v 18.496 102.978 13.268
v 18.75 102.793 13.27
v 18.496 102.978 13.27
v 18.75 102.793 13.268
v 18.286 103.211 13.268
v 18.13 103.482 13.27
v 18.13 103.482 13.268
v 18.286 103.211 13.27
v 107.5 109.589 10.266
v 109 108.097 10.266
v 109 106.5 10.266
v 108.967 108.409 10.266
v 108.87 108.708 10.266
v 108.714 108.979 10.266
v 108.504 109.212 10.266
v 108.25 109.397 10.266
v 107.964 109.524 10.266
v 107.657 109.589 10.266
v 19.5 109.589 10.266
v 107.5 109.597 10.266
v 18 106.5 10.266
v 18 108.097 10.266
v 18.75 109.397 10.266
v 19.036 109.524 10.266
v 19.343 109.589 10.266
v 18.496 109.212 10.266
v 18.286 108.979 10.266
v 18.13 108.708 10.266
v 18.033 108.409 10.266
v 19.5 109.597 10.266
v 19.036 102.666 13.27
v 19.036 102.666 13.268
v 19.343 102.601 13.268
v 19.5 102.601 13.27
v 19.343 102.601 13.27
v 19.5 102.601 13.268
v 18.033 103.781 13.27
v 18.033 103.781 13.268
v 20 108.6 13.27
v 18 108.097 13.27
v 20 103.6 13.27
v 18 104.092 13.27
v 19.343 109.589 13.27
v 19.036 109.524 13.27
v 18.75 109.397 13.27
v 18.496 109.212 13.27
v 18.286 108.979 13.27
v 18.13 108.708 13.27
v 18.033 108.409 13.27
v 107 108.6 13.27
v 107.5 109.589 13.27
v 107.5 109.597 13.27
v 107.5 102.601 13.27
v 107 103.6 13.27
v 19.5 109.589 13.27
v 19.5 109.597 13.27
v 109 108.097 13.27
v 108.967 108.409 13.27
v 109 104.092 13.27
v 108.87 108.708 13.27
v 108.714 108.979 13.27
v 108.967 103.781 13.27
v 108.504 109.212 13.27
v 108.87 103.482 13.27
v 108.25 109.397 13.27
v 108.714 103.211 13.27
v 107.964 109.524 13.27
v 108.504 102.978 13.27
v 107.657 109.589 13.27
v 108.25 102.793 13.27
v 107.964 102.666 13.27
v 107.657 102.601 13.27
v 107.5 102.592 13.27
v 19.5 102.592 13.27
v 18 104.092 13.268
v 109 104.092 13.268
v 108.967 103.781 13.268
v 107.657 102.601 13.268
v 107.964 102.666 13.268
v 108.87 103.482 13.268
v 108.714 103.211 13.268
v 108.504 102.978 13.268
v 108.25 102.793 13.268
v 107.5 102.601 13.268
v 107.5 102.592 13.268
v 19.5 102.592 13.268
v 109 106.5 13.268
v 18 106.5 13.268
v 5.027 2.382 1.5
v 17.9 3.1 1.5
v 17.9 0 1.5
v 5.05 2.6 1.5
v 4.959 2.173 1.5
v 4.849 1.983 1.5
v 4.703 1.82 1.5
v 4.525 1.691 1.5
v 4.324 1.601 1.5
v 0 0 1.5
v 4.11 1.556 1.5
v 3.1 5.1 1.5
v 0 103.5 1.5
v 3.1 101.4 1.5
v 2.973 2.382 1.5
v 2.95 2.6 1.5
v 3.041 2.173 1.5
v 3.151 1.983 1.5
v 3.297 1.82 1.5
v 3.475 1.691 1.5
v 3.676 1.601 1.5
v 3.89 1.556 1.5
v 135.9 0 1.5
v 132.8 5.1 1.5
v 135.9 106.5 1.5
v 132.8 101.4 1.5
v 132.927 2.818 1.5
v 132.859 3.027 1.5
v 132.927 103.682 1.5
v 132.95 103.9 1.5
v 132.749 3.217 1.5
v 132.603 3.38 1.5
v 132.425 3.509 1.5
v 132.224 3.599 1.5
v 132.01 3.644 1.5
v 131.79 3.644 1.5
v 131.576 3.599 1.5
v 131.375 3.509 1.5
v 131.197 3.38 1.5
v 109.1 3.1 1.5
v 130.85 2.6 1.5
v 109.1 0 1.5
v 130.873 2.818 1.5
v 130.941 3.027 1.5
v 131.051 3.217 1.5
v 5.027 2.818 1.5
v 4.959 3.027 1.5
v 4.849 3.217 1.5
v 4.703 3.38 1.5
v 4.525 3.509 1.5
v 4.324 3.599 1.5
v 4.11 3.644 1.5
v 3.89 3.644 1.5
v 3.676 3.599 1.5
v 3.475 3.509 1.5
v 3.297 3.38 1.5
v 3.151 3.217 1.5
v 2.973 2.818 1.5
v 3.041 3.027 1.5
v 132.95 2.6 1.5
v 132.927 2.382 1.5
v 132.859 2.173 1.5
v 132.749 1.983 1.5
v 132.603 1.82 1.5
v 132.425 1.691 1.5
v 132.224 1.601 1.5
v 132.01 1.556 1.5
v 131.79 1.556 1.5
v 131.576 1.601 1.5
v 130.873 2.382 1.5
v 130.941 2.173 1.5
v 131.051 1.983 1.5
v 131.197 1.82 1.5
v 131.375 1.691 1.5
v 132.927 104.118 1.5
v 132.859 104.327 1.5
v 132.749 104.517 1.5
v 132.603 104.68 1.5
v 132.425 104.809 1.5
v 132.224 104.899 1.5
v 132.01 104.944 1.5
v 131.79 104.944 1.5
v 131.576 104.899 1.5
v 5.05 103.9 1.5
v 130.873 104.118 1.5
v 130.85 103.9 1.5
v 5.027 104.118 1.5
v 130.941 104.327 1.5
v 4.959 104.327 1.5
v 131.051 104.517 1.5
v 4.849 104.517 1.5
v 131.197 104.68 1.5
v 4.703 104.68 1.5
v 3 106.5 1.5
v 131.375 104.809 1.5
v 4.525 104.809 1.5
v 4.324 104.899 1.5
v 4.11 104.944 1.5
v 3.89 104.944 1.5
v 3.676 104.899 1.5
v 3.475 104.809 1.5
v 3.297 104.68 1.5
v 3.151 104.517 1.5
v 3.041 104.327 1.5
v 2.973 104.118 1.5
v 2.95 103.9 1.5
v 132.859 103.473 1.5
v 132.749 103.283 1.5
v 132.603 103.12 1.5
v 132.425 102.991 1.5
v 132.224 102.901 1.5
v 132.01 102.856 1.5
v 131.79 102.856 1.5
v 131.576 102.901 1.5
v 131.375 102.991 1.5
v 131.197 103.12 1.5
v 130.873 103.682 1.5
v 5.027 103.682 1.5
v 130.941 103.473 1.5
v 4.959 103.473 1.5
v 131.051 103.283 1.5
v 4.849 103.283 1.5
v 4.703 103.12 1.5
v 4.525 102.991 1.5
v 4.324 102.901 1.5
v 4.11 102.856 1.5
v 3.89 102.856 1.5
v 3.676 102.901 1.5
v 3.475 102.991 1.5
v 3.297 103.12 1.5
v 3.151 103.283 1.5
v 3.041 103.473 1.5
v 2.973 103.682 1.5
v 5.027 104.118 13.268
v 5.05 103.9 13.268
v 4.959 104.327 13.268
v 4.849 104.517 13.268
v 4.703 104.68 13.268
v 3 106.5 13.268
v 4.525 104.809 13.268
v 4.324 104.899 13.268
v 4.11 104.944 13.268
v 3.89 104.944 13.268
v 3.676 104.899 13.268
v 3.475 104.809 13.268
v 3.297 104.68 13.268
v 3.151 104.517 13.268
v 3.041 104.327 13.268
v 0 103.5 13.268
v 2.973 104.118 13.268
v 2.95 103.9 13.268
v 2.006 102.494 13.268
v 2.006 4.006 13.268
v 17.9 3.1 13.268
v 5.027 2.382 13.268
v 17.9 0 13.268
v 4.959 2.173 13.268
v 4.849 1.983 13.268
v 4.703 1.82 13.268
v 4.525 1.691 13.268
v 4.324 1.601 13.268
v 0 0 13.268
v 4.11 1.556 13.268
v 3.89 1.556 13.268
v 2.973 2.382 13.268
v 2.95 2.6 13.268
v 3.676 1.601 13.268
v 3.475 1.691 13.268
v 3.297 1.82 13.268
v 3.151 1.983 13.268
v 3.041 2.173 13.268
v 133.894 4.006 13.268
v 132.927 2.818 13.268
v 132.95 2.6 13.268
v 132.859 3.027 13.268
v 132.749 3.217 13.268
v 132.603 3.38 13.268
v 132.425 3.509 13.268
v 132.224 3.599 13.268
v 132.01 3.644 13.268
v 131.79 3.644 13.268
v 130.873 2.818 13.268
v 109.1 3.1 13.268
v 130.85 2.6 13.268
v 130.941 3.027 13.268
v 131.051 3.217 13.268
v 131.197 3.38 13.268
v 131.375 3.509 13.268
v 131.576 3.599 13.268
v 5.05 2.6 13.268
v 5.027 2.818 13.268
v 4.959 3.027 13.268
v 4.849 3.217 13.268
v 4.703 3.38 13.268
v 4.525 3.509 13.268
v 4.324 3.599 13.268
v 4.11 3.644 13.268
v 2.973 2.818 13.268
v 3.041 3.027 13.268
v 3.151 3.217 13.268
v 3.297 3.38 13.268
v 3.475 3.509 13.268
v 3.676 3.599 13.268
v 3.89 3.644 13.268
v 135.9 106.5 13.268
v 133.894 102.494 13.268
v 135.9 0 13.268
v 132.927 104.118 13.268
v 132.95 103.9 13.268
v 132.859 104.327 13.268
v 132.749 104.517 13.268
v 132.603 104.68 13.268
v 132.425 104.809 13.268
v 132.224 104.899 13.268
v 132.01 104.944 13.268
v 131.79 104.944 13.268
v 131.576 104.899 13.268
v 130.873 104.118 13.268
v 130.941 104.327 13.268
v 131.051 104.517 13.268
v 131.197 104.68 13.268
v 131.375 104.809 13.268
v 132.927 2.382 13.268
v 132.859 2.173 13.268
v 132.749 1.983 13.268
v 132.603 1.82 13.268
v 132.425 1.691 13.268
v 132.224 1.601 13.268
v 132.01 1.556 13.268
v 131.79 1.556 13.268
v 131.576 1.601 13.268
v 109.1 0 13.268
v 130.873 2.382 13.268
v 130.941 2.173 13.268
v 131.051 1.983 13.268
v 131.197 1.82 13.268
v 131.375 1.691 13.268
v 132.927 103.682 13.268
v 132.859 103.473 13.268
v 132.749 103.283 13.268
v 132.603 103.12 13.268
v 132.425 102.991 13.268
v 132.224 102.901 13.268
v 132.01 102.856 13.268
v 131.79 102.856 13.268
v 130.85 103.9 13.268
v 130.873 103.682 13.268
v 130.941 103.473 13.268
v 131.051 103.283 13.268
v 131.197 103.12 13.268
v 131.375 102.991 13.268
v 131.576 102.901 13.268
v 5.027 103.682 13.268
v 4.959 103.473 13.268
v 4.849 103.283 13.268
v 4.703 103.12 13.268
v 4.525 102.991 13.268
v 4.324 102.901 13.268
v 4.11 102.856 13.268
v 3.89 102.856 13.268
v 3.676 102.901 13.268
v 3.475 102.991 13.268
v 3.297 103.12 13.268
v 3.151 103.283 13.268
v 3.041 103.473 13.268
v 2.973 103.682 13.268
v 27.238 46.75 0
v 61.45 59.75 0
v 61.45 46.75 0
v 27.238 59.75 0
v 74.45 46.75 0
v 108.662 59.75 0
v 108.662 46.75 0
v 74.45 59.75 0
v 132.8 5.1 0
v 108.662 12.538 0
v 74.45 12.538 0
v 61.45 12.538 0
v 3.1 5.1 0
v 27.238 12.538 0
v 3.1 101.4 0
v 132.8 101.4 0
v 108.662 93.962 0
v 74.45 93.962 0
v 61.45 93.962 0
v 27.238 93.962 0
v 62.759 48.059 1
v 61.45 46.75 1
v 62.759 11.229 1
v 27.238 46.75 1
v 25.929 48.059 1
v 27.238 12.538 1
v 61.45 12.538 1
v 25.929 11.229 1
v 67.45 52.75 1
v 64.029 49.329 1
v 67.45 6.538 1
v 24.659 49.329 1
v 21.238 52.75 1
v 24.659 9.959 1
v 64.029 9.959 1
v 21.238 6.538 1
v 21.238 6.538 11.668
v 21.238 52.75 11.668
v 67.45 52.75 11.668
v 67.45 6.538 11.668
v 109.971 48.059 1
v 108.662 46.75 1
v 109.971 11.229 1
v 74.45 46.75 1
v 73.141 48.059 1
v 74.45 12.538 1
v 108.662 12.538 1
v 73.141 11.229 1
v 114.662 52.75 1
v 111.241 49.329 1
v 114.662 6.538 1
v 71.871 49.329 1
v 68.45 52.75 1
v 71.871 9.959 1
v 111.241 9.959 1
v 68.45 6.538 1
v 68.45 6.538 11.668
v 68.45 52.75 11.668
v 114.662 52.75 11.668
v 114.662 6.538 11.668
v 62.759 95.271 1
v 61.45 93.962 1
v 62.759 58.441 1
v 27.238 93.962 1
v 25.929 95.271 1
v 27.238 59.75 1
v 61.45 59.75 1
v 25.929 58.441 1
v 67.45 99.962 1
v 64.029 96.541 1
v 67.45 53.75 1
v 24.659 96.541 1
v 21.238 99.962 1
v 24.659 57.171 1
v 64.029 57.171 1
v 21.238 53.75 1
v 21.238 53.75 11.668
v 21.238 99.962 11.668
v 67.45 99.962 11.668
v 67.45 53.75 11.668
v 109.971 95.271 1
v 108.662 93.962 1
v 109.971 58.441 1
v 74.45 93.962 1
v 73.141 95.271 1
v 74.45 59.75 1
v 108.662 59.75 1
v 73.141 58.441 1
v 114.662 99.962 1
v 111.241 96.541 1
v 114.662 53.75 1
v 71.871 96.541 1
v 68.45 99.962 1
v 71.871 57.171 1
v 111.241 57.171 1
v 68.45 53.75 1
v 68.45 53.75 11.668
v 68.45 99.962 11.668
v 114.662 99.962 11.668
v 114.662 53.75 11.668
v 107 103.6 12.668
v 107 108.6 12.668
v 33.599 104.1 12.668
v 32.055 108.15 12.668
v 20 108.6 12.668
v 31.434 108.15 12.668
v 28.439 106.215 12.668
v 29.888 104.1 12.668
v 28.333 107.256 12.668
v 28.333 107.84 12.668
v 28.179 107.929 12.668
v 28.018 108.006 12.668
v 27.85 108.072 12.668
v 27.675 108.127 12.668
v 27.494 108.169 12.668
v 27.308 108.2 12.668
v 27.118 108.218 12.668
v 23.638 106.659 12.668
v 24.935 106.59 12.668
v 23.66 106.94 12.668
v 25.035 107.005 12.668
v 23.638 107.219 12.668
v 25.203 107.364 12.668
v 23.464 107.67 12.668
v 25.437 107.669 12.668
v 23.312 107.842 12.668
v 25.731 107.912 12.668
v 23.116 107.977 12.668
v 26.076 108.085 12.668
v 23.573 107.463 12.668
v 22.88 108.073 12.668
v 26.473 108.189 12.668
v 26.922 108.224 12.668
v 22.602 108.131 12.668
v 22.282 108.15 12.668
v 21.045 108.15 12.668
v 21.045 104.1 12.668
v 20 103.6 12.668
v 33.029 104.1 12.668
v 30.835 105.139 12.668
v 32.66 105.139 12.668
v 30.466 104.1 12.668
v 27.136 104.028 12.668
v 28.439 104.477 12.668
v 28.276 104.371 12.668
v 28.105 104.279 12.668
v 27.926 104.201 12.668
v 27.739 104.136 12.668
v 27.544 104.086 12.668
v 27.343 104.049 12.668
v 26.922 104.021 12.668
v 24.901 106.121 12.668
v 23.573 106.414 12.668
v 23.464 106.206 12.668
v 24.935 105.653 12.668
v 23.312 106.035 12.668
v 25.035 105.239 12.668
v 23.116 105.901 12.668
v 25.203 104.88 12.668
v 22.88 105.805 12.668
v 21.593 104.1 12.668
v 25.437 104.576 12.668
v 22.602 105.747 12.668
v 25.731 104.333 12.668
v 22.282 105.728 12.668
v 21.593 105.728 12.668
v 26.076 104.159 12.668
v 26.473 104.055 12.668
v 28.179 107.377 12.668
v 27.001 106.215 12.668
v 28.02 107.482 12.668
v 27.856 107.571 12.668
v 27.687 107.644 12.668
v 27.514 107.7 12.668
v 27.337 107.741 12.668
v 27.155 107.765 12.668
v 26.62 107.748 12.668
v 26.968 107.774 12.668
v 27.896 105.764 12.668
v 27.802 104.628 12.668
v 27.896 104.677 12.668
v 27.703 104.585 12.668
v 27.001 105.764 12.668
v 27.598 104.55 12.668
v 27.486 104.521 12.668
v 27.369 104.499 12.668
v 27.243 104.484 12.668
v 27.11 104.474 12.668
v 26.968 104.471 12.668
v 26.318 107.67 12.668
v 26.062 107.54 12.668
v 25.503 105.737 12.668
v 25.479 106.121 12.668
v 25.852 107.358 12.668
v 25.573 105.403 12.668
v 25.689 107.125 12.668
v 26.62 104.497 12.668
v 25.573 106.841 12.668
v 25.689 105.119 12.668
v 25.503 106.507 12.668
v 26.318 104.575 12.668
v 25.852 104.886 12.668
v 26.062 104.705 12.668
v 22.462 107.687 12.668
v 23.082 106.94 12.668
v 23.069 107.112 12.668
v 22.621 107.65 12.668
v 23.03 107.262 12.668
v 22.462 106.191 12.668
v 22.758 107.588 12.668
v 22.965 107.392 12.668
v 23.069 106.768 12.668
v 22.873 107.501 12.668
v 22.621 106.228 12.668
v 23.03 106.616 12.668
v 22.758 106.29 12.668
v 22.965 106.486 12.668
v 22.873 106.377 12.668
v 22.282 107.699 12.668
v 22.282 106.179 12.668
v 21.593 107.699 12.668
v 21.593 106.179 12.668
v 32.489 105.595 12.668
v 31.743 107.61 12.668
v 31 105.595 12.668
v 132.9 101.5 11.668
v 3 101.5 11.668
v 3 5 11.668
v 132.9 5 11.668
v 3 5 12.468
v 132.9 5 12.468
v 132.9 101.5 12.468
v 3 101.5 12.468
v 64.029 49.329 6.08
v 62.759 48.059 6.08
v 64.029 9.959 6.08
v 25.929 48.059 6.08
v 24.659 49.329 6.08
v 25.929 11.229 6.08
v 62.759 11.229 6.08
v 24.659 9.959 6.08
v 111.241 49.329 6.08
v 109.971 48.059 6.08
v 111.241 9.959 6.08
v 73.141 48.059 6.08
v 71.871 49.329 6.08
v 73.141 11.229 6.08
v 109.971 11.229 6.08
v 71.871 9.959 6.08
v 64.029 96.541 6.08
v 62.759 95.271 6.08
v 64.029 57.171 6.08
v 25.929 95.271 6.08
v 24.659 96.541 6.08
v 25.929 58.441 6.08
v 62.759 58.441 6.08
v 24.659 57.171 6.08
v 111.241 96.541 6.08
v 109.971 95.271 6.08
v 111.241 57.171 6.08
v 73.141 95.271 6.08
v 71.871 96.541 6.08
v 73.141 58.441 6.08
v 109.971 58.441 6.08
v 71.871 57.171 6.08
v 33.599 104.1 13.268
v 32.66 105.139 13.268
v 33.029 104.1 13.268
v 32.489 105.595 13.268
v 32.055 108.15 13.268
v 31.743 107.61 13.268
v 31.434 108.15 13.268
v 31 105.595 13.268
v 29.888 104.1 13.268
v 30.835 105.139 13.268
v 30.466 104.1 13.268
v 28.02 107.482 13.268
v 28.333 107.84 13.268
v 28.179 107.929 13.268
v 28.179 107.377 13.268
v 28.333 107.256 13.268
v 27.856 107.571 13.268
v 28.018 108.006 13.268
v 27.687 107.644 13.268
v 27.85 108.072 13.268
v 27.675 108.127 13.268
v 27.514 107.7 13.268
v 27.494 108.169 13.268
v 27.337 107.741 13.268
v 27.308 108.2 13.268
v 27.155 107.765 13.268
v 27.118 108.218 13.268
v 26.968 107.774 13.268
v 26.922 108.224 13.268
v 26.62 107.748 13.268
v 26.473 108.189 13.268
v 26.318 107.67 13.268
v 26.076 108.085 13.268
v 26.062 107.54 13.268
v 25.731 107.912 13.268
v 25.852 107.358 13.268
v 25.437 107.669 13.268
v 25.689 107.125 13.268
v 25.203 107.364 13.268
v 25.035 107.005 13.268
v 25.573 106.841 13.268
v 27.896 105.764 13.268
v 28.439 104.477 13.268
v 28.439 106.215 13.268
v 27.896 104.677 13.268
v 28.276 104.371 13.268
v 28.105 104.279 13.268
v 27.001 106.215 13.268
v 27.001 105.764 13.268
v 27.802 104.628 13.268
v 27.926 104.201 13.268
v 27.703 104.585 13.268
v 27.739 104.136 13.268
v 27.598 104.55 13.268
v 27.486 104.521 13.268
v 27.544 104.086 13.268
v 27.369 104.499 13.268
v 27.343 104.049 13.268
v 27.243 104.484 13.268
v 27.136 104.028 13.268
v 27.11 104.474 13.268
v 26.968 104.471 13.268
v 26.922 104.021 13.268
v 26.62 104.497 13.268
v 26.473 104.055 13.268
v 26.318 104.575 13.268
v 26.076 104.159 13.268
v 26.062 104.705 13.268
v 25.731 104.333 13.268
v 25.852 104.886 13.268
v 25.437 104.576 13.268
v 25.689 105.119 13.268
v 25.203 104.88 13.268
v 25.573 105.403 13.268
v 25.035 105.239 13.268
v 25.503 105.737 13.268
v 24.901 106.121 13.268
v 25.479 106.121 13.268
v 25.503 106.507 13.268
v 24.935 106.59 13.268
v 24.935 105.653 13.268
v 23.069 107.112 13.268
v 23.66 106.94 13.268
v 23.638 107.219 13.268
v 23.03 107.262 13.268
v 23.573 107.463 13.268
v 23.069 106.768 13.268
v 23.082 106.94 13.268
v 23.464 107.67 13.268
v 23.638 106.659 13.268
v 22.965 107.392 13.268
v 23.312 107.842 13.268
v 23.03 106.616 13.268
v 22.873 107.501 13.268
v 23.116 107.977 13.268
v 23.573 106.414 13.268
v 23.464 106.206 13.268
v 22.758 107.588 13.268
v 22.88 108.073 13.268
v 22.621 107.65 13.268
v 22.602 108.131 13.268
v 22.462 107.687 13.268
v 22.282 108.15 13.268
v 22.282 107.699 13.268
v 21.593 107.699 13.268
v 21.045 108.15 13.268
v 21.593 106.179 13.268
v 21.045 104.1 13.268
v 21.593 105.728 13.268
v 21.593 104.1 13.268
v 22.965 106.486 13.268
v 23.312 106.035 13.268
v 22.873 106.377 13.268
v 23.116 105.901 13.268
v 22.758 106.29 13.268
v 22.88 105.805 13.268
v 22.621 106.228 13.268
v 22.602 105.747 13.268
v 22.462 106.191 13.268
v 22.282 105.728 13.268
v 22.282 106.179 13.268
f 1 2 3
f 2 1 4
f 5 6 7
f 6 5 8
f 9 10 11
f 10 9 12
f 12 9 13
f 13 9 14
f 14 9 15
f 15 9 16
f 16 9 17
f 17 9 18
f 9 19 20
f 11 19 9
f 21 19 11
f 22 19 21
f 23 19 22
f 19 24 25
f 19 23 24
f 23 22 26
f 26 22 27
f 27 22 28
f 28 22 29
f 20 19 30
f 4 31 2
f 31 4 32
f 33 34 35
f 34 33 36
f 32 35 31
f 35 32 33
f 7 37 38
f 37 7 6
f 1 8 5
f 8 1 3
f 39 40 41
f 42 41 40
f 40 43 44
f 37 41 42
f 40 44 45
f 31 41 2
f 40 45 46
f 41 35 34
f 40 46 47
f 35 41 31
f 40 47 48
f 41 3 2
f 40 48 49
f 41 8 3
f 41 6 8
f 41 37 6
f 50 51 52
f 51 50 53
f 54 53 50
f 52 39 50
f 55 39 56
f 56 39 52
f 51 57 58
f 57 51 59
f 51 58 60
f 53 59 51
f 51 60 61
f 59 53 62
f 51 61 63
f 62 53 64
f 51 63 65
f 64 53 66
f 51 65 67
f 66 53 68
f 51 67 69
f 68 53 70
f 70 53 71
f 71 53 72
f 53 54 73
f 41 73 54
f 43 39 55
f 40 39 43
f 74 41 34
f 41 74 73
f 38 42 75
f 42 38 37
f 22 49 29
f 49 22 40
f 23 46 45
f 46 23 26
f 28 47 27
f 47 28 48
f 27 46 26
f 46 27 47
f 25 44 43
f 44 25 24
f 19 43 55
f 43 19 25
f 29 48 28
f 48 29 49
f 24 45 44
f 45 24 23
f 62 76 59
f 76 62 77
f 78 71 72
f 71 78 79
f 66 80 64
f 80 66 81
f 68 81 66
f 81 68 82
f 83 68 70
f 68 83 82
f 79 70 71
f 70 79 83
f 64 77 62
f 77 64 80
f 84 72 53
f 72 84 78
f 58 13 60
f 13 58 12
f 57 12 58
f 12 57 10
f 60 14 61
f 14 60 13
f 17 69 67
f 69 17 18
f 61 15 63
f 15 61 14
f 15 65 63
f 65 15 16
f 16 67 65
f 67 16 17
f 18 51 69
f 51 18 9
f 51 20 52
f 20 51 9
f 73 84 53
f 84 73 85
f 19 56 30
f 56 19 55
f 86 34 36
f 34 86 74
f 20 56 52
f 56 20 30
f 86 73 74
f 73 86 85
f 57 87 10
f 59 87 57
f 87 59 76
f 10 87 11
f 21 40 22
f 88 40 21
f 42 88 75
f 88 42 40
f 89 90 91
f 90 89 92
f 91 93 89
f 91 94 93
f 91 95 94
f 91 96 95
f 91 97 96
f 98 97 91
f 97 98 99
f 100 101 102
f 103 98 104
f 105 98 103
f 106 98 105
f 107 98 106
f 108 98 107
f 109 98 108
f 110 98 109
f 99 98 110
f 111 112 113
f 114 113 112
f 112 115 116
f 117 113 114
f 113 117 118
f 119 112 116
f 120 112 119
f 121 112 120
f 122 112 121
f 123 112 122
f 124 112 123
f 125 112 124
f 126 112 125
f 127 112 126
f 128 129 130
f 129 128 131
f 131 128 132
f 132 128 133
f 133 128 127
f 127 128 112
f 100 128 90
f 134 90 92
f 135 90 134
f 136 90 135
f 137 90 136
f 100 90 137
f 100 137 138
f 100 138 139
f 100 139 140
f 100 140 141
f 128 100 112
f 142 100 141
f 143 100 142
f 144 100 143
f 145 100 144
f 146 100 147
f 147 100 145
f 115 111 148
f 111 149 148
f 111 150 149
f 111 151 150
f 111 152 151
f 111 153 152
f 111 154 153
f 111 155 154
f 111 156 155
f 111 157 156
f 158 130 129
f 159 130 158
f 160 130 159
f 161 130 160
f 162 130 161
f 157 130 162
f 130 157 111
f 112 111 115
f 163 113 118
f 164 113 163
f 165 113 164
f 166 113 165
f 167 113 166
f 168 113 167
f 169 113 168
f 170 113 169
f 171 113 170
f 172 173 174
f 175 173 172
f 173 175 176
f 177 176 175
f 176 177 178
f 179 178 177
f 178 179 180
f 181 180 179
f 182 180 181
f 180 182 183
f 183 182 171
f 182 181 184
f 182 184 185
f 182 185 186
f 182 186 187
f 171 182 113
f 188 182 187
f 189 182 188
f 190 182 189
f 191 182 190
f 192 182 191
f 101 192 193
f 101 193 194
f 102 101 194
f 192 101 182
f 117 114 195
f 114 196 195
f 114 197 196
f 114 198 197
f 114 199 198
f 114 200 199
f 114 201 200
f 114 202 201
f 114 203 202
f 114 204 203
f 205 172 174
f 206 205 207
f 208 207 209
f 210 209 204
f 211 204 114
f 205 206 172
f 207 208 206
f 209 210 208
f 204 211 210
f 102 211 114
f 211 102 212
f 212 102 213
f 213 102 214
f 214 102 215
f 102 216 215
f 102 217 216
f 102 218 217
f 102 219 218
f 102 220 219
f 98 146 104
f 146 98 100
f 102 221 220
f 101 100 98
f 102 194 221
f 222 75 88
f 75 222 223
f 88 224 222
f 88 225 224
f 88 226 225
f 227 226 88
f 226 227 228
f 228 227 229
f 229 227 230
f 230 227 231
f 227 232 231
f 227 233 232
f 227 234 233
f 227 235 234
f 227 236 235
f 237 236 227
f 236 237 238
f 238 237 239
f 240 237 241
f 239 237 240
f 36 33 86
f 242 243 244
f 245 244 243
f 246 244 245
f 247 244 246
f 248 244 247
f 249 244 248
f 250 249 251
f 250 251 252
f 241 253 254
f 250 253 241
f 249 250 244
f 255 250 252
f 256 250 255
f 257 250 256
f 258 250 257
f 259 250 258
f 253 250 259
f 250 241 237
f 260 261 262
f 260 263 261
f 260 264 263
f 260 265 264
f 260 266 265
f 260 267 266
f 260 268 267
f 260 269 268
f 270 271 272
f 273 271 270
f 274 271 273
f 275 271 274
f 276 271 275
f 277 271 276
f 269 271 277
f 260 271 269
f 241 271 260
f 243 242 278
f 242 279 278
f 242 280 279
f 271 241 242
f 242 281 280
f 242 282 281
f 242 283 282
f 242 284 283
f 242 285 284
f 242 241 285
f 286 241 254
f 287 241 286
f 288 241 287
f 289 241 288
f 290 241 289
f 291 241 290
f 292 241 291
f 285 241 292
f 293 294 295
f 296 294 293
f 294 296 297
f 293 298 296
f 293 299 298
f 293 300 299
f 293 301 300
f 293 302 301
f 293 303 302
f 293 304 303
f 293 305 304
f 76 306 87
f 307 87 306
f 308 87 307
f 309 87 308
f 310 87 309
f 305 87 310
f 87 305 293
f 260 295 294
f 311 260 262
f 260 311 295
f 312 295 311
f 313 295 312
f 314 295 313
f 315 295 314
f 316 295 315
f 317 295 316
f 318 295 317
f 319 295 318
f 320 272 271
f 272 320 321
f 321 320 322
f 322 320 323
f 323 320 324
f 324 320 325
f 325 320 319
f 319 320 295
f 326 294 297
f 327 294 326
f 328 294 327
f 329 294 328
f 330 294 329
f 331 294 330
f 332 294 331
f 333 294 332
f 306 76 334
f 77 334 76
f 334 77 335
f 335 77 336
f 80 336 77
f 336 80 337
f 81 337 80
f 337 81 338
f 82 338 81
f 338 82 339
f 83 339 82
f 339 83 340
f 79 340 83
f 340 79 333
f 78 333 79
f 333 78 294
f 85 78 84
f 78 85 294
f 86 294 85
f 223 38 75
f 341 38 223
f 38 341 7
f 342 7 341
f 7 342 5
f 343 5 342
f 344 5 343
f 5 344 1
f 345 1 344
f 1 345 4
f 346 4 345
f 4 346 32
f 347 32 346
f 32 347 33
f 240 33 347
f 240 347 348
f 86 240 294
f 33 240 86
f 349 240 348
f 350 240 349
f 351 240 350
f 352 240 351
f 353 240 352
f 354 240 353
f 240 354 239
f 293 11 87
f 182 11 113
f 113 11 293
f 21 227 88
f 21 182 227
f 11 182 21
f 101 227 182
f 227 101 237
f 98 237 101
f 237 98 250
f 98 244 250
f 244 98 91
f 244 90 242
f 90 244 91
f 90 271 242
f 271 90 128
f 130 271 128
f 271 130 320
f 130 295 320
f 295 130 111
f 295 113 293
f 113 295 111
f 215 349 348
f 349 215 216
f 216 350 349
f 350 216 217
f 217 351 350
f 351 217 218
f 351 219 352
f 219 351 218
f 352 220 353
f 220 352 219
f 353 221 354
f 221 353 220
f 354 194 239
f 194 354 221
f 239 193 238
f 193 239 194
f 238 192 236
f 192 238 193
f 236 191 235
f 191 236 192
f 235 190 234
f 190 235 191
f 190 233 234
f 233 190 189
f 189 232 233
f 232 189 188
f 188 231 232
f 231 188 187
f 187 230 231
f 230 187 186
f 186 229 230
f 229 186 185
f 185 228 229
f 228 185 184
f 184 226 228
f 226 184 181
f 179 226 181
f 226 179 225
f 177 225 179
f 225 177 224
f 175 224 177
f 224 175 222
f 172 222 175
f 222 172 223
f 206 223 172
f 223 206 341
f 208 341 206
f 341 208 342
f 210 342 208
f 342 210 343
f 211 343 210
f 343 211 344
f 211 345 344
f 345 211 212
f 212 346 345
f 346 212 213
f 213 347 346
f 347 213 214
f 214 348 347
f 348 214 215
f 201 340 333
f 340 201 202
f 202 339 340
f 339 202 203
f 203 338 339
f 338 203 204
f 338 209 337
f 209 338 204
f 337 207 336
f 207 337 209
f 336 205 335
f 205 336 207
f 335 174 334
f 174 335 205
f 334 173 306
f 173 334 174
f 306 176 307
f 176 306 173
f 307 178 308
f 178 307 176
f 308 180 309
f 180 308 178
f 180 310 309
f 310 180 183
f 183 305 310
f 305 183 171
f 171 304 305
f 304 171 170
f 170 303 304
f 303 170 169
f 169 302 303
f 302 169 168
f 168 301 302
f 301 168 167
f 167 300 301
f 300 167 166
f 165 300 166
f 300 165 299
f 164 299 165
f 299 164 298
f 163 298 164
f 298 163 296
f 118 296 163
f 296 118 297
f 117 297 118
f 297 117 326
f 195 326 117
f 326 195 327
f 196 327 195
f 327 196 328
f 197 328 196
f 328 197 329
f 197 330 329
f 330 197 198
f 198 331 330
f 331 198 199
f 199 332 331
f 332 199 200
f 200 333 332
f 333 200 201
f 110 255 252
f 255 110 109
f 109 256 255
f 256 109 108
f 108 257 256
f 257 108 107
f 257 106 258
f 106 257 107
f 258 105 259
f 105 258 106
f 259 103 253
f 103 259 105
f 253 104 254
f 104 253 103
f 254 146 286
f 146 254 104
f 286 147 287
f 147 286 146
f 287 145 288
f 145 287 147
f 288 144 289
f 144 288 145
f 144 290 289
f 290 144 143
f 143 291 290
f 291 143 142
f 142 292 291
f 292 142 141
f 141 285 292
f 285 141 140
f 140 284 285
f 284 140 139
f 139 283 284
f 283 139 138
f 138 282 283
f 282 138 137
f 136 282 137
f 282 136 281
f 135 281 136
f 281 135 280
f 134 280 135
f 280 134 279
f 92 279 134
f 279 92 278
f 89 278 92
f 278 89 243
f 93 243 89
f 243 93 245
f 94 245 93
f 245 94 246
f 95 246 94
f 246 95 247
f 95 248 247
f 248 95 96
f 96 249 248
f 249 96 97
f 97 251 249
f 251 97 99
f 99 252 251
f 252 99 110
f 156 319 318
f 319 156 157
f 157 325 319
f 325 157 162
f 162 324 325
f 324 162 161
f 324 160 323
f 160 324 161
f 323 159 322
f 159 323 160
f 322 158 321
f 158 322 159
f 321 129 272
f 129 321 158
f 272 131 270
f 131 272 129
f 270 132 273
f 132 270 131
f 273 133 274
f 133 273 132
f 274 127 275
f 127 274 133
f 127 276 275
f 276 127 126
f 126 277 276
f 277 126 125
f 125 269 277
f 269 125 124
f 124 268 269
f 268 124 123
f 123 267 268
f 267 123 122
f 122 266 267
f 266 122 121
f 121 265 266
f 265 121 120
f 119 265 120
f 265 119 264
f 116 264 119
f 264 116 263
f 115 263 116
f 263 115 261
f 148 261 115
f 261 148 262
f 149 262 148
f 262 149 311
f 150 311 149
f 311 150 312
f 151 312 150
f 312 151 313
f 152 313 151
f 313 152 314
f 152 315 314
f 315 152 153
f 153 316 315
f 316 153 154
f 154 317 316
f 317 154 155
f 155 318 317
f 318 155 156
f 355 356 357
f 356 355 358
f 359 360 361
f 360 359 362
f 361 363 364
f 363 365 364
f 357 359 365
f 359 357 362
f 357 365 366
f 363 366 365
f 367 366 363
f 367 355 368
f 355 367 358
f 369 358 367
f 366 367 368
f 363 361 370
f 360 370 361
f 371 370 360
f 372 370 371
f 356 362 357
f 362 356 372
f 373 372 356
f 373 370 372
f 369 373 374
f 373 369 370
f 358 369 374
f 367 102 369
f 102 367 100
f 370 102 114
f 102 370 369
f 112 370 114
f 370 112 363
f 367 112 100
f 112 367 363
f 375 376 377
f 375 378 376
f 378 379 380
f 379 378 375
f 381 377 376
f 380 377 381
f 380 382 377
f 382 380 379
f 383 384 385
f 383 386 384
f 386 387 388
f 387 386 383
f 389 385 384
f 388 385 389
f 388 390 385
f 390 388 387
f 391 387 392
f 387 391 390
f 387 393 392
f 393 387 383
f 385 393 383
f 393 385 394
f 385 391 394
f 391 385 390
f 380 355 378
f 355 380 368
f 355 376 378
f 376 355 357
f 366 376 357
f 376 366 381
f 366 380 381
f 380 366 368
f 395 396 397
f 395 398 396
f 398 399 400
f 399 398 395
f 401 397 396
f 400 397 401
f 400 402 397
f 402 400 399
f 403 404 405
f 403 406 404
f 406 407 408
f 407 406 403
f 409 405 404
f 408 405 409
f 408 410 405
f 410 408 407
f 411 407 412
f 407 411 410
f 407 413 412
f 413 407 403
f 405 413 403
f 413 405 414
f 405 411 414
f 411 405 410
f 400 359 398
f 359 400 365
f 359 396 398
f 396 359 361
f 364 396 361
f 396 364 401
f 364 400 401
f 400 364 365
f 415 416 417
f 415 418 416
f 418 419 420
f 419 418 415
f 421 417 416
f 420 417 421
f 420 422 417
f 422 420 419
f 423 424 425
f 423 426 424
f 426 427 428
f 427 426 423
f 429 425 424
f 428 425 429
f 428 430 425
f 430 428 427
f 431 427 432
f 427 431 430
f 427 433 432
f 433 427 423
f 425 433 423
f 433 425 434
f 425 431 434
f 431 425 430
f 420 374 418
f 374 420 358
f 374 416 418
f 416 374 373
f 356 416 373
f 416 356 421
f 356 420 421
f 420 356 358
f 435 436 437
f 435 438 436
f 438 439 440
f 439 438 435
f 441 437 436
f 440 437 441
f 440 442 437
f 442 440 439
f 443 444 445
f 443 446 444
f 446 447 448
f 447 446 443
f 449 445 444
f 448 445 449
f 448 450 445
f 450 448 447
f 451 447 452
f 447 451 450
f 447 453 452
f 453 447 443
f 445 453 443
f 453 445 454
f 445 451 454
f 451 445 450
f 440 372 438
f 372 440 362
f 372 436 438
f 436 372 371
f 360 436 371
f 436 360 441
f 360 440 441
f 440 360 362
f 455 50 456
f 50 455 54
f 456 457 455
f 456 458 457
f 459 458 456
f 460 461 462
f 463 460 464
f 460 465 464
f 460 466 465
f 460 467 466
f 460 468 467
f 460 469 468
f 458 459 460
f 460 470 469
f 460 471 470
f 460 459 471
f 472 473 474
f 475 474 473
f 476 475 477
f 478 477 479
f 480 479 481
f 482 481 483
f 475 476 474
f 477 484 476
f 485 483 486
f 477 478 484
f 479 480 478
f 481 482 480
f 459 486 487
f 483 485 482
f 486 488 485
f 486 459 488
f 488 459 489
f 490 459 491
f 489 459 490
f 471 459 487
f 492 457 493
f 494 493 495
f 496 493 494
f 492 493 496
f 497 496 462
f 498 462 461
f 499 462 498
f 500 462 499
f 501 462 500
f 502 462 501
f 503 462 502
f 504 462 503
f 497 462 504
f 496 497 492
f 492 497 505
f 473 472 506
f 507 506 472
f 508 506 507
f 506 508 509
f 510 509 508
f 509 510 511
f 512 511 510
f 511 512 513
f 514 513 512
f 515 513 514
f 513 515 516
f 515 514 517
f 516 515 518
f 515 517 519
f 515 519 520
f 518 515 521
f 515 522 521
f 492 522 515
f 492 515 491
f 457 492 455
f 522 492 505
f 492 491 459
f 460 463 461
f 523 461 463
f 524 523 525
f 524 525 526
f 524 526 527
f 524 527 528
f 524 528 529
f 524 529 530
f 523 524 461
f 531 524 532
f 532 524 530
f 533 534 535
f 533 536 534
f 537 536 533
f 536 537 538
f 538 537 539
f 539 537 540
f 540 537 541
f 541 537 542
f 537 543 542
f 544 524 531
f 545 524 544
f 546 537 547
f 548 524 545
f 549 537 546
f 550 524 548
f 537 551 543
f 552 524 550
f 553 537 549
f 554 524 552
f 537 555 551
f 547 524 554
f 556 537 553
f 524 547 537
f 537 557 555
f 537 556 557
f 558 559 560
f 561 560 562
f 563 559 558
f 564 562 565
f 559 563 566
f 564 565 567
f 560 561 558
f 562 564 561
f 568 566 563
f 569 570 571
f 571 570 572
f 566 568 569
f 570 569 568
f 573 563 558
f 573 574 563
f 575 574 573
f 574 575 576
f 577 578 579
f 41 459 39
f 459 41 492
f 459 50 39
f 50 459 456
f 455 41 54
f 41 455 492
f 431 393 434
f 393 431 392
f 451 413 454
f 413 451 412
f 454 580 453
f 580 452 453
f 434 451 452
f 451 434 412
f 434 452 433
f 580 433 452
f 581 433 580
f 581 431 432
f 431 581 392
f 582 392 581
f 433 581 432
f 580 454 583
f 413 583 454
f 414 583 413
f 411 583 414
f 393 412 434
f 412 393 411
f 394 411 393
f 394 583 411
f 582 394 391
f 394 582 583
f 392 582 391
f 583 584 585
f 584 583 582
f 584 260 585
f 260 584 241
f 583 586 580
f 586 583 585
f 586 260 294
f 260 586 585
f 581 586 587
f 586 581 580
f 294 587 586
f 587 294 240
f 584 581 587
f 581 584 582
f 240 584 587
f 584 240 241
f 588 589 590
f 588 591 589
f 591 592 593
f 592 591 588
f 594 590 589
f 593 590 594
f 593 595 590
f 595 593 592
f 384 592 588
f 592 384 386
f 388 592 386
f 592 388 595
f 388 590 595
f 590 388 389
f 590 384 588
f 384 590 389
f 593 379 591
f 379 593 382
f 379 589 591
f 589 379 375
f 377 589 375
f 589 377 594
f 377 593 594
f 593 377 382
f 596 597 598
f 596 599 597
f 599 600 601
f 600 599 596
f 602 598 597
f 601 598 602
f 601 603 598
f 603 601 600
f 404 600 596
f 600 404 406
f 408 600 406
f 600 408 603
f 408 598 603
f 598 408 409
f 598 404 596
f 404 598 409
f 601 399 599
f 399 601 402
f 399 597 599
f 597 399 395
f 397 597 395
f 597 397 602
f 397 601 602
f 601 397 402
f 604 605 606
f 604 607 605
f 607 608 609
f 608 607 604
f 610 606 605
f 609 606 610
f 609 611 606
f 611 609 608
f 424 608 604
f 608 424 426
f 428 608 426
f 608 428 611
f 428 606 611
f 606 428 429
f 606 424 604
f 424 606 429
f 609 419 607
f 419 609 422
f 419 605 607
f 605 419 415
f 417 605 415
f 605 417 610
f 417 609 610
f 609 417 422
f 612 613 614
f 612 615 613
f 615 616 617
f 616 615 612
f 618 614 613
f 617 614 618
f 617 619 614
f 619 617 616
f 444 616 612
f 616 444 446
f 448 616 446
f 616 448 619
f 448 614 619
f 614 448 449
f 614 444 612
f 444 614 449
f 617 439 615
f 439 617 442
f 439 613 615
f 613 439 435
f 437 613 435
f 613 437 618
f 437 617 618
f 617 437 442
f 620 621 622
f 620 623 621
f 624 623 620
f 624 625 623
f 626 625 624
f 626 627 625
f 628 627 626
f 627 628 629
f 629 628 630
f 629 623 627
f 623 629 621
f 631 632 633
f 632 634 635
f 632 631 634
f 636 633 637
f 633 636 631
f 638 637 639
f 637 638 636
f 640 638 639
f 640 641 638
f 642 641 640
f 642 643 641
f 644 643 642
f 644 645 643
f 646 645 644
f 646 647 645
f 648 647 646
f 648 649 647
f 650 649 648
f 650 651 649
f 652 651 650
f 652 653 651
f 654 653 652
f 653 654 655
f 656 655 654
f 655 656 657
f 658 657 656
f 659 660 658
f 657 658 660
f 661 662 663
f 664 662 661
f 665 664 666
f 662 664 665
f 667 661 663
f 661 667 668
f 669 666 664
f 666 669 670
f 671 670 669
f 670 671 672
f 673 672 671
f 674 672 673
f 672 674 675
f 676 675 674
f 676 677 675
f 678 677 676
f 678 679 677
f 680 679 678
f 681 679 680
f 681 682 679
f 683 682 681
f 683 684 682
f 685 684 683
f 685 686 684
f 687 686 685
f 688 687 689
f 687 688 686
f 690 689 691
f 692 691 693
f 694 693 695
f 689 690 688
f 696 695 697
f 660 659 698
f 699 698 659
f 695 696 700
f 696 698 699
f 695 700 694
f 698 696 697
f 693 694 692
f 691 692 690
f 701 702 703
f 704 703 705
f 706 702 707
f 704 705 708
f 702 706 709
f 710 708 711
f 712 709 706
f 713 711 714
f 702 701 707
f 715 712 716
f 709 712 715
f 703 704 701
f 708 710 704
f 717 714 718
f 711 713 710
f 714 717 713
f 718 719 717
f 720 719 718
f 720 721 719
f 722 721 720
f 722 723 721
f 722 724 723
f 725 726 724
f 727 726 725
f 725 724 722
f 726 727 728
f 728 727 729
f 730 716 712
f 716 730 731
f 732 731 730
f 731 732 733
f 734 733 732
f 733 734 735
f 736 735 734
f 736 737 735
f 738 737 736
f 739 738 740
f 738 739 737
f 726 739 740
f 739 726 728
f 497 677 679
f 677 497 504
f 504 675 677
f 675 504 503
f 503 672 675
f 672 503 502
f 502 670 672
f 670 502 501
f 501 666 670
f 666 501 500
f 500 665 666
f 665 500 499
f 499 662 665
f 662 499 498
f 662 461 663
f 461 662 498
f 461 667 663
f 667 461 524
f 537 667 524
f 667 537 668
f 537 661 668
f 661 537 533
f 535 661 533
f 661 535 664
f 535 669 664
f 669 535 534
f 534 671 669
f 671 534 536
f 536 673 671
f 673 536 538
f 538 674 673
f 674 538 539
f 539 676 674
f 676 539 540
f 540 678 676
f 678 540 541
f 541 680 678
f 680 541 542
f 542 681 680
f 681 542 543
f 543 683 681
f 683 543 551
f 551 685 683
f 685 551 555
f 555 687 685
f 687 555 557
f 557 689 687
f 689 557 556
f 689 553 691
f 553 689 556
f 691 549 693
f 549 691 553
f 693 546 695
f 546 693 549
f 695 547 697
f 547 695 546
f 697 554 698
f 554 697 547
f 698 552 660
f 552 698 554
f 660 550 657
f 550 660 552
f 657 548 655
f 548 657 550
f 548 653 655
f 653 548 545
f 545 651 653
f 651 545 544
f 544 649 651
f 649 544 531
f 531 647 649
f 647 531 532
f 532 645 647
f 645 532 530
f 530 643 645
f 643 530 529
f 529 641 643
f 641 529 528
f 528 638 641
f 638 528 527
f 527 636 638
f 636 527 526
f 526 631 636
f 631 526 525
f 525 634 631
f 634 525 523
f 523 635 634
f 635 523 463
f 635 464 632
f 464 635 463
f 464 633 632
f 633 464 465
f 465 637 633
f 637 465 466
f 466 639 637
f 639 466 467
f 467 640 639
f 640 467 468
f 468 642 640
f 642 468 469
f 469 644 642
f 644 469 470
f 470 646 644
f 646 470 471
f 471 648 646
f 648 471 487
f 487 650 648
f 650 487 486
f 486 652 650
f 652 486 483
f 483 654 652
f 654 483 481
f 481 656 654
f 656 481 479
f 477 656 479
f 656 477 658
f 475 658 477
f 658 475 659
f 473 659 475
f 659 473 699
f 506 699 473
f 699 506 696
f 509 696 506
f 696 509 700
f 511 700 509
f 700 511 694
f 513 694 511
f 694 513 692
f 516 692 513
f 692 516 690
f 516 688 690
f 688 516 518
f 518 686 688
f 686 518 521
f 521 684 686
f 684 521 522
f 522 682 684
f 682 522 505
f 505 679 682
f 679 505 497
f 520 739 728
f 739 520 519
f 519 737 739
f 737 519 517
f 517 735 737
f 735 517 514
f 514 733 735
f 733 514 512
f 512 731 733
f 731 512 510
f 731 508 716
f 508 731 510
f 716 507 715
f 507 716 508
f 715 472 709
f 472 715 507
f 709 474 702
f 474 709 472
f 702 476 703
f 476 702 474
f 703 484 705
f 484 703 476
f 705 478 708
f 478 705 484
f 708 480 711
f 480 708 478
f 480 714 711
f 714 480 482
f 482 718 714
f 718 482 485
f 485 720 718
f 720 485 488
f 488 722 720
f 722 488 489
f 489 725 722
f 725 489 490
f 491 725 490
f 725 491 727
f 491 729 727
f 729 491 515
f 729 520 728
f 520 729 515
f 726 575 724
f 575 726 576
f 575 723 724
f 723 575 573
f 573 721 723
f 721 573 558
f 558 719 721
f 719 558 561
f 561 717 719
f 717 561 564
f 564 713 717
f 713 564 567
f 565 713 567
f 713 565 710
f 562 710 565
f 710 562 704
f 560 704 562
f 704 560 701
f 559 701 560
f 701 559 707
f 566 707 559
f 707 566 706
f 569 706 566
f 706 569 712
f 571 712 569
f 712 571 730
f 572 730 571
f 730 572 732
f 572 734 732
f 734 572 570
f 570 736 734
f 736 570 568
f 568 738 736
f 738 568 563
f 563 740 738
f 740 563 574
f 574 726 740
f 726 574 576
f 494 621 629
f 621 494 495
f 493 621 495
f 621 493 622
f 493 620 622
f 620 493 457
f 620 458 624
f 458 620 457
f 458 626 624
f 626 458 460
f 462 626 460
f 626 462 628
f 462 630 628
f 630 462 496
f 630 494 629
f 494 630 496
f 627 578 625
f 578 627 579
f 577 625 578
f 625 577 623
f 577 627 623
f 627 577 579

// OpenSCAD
/*
 * Mini JEDEC-style tray for packages conforming to JEDEC MO-067-B
 *
 * Copyright 2024, Rick Altherr
 *
 * Licensed under the Apache License, Version 2.0 (the "License");
 * you may not use this file except in compliance with the License.
 * You may obtain a copy of the License at
 *
 *         http://www.apache.org/licenses/LICENSE-2.0
 *
 * Unless required by applicable law or agreed to in writing, software
 * distributed under the License is distributed on an "AS IS" BASIS,
 * WITHOUT WARRANTIES OR CONDITIONS OF ANY KIND, either express or implied.
 * See the License for the specific language governing permissions and
 * limitations under the License.
 */

/* [Parameters] */

// Text to emboss into the tray's tab
Tab_Text = "PGA";

// (X, Y, Z) size (in inches) of body. Labeled (D, E, A) in MO-067-B.
Body_Size = [1.78, 1.78, 0.145]; // [0:0.001:300]

// Number of pins per row/col. Labeled M in JEDEC MO-067-B.
Pin_Matrix_Size = 17; // 1.0

// Pin pitch (in inches).
Pin_Pitch = 0.100; // 0.001

// Maximum distance (in inches) from bottom of the body to the seating plane. Labeled Q in JEDEC MO-067-B.
Body_To_Seating_Plane_Height = 0.075; // 0.001

// Pin length from seating plane (in inches). Labeled L in JEDEC MO-067-B.
Pin_Length_From_Seating_Plane = 0.200; // 0.001

use <tray.scad>

/* [Hidden] */
$fs = 0.01;

Inch_To_mm = 25.4;

Pin_Pitch_mm = Pin_Pitch * Inch_To_mm;
Body_To_Seating_Plane_Height_mm = Body_To_Seating_Plane_Height * Inch_To_mm;
Pin_Length_From_Seating_Plane_mm = Pin_Length_From_Seating_Plane * Inch_To_mm;

Package_Size_mm = [
    Body_Size.x * Inch_To_mm,
    Body_Size.y * Inch_To_mm,
    Body_Size.z * Inch_To_mm + Body_To_Seating_Plane_Height_mm + Pin_Length_From_Seating_Plane_mm
];

Tray(
    well_content_size = Package_Size_mm,
    tab_text = Tab_Text
) PGA_Well();

module PGA_Well() {
    Package_To_Outermode_Pin_Center = [
        (Package_Size_mm.x - ((Pin_Matrix_Size - 1) * (Pin_Pitch_mm)))/2,
        (Package_Size_mm.y - ((Pin_Matrix_Size - 1) * (Pin_Pitch_mm)))/2,
    ];

    linear_extrude(height = Pin_Length_From_Seating_Plane_mm)
    polygon(
        points = [
            [
                Package_To_Outermode_Pin_Center.x + Pin_Pitch_mm / 4,
                Package_To_Outermode_Pin_Center.y + Pin_Pitch_mm / 4,
            ],
            [
                Package_Size_mm.x - Package_To_Outermode_Pin_Center.x - Pin_Pitch_mm / 4,
                Package_To_Outermode_Pin_Center.y + Pin_Pitch_mm / 4,
            ],
            [
                Package_Size_mm.x - Package_To_Outermode_Pin_Center.x - Pin_Pitch_mm / 4,
                Package_Size_mm.y - Package_To_Outermode_Pin_Center.y - Pin_Pitch_mm / 4,
            ],
            [
                Package_To_Outermode_Pin_Center.x + Pin_Pitch_mm / 4,
                Package_Size_mm.y - Package_To_Outermode_Pin_Center.y - Pin_Pitch_mm / 4,
            ],
            [
                Package_To_Outermode_Pin_Center.x + Pin_Pitch_mm * 3 / 4,
                Package_To_Outermode_Pin_Center.y + Pin_Pitch_mm * 3 / 4,
            ],
            [
                Package_Size_mm.x - Package_To_Outermode_Pin_Center.x - Pin_Pitch_mm * 3 / 4,
                Package_To_Outermode_Pin_Center.y + Pin_Pitch_mm * 3 / 4,
            ],
            [
                Package_Size_mm.x - Package_To_Outermode_Pin_Center.x - Pin_Pitch_mm * 3 / 4,
                Package_Size_mm.y - Package_To_Outermode_Pin_Center.y - Pin_Pitch_mm * 3 / 4,
            ],
            [
                Package_To_Outermode_Pin_Center.x + Pin_Pitch_mm * 3 / 4,
                Package_Size_mm.y - Package_To_Outermode_Pin_Center.y - Pin_Pitch_mm * 3 / 4,
            ],
        ],
        paths = [
            [0, 1, 2, 3],
            [4, 5, 6, 7]
        ]
    );
}
